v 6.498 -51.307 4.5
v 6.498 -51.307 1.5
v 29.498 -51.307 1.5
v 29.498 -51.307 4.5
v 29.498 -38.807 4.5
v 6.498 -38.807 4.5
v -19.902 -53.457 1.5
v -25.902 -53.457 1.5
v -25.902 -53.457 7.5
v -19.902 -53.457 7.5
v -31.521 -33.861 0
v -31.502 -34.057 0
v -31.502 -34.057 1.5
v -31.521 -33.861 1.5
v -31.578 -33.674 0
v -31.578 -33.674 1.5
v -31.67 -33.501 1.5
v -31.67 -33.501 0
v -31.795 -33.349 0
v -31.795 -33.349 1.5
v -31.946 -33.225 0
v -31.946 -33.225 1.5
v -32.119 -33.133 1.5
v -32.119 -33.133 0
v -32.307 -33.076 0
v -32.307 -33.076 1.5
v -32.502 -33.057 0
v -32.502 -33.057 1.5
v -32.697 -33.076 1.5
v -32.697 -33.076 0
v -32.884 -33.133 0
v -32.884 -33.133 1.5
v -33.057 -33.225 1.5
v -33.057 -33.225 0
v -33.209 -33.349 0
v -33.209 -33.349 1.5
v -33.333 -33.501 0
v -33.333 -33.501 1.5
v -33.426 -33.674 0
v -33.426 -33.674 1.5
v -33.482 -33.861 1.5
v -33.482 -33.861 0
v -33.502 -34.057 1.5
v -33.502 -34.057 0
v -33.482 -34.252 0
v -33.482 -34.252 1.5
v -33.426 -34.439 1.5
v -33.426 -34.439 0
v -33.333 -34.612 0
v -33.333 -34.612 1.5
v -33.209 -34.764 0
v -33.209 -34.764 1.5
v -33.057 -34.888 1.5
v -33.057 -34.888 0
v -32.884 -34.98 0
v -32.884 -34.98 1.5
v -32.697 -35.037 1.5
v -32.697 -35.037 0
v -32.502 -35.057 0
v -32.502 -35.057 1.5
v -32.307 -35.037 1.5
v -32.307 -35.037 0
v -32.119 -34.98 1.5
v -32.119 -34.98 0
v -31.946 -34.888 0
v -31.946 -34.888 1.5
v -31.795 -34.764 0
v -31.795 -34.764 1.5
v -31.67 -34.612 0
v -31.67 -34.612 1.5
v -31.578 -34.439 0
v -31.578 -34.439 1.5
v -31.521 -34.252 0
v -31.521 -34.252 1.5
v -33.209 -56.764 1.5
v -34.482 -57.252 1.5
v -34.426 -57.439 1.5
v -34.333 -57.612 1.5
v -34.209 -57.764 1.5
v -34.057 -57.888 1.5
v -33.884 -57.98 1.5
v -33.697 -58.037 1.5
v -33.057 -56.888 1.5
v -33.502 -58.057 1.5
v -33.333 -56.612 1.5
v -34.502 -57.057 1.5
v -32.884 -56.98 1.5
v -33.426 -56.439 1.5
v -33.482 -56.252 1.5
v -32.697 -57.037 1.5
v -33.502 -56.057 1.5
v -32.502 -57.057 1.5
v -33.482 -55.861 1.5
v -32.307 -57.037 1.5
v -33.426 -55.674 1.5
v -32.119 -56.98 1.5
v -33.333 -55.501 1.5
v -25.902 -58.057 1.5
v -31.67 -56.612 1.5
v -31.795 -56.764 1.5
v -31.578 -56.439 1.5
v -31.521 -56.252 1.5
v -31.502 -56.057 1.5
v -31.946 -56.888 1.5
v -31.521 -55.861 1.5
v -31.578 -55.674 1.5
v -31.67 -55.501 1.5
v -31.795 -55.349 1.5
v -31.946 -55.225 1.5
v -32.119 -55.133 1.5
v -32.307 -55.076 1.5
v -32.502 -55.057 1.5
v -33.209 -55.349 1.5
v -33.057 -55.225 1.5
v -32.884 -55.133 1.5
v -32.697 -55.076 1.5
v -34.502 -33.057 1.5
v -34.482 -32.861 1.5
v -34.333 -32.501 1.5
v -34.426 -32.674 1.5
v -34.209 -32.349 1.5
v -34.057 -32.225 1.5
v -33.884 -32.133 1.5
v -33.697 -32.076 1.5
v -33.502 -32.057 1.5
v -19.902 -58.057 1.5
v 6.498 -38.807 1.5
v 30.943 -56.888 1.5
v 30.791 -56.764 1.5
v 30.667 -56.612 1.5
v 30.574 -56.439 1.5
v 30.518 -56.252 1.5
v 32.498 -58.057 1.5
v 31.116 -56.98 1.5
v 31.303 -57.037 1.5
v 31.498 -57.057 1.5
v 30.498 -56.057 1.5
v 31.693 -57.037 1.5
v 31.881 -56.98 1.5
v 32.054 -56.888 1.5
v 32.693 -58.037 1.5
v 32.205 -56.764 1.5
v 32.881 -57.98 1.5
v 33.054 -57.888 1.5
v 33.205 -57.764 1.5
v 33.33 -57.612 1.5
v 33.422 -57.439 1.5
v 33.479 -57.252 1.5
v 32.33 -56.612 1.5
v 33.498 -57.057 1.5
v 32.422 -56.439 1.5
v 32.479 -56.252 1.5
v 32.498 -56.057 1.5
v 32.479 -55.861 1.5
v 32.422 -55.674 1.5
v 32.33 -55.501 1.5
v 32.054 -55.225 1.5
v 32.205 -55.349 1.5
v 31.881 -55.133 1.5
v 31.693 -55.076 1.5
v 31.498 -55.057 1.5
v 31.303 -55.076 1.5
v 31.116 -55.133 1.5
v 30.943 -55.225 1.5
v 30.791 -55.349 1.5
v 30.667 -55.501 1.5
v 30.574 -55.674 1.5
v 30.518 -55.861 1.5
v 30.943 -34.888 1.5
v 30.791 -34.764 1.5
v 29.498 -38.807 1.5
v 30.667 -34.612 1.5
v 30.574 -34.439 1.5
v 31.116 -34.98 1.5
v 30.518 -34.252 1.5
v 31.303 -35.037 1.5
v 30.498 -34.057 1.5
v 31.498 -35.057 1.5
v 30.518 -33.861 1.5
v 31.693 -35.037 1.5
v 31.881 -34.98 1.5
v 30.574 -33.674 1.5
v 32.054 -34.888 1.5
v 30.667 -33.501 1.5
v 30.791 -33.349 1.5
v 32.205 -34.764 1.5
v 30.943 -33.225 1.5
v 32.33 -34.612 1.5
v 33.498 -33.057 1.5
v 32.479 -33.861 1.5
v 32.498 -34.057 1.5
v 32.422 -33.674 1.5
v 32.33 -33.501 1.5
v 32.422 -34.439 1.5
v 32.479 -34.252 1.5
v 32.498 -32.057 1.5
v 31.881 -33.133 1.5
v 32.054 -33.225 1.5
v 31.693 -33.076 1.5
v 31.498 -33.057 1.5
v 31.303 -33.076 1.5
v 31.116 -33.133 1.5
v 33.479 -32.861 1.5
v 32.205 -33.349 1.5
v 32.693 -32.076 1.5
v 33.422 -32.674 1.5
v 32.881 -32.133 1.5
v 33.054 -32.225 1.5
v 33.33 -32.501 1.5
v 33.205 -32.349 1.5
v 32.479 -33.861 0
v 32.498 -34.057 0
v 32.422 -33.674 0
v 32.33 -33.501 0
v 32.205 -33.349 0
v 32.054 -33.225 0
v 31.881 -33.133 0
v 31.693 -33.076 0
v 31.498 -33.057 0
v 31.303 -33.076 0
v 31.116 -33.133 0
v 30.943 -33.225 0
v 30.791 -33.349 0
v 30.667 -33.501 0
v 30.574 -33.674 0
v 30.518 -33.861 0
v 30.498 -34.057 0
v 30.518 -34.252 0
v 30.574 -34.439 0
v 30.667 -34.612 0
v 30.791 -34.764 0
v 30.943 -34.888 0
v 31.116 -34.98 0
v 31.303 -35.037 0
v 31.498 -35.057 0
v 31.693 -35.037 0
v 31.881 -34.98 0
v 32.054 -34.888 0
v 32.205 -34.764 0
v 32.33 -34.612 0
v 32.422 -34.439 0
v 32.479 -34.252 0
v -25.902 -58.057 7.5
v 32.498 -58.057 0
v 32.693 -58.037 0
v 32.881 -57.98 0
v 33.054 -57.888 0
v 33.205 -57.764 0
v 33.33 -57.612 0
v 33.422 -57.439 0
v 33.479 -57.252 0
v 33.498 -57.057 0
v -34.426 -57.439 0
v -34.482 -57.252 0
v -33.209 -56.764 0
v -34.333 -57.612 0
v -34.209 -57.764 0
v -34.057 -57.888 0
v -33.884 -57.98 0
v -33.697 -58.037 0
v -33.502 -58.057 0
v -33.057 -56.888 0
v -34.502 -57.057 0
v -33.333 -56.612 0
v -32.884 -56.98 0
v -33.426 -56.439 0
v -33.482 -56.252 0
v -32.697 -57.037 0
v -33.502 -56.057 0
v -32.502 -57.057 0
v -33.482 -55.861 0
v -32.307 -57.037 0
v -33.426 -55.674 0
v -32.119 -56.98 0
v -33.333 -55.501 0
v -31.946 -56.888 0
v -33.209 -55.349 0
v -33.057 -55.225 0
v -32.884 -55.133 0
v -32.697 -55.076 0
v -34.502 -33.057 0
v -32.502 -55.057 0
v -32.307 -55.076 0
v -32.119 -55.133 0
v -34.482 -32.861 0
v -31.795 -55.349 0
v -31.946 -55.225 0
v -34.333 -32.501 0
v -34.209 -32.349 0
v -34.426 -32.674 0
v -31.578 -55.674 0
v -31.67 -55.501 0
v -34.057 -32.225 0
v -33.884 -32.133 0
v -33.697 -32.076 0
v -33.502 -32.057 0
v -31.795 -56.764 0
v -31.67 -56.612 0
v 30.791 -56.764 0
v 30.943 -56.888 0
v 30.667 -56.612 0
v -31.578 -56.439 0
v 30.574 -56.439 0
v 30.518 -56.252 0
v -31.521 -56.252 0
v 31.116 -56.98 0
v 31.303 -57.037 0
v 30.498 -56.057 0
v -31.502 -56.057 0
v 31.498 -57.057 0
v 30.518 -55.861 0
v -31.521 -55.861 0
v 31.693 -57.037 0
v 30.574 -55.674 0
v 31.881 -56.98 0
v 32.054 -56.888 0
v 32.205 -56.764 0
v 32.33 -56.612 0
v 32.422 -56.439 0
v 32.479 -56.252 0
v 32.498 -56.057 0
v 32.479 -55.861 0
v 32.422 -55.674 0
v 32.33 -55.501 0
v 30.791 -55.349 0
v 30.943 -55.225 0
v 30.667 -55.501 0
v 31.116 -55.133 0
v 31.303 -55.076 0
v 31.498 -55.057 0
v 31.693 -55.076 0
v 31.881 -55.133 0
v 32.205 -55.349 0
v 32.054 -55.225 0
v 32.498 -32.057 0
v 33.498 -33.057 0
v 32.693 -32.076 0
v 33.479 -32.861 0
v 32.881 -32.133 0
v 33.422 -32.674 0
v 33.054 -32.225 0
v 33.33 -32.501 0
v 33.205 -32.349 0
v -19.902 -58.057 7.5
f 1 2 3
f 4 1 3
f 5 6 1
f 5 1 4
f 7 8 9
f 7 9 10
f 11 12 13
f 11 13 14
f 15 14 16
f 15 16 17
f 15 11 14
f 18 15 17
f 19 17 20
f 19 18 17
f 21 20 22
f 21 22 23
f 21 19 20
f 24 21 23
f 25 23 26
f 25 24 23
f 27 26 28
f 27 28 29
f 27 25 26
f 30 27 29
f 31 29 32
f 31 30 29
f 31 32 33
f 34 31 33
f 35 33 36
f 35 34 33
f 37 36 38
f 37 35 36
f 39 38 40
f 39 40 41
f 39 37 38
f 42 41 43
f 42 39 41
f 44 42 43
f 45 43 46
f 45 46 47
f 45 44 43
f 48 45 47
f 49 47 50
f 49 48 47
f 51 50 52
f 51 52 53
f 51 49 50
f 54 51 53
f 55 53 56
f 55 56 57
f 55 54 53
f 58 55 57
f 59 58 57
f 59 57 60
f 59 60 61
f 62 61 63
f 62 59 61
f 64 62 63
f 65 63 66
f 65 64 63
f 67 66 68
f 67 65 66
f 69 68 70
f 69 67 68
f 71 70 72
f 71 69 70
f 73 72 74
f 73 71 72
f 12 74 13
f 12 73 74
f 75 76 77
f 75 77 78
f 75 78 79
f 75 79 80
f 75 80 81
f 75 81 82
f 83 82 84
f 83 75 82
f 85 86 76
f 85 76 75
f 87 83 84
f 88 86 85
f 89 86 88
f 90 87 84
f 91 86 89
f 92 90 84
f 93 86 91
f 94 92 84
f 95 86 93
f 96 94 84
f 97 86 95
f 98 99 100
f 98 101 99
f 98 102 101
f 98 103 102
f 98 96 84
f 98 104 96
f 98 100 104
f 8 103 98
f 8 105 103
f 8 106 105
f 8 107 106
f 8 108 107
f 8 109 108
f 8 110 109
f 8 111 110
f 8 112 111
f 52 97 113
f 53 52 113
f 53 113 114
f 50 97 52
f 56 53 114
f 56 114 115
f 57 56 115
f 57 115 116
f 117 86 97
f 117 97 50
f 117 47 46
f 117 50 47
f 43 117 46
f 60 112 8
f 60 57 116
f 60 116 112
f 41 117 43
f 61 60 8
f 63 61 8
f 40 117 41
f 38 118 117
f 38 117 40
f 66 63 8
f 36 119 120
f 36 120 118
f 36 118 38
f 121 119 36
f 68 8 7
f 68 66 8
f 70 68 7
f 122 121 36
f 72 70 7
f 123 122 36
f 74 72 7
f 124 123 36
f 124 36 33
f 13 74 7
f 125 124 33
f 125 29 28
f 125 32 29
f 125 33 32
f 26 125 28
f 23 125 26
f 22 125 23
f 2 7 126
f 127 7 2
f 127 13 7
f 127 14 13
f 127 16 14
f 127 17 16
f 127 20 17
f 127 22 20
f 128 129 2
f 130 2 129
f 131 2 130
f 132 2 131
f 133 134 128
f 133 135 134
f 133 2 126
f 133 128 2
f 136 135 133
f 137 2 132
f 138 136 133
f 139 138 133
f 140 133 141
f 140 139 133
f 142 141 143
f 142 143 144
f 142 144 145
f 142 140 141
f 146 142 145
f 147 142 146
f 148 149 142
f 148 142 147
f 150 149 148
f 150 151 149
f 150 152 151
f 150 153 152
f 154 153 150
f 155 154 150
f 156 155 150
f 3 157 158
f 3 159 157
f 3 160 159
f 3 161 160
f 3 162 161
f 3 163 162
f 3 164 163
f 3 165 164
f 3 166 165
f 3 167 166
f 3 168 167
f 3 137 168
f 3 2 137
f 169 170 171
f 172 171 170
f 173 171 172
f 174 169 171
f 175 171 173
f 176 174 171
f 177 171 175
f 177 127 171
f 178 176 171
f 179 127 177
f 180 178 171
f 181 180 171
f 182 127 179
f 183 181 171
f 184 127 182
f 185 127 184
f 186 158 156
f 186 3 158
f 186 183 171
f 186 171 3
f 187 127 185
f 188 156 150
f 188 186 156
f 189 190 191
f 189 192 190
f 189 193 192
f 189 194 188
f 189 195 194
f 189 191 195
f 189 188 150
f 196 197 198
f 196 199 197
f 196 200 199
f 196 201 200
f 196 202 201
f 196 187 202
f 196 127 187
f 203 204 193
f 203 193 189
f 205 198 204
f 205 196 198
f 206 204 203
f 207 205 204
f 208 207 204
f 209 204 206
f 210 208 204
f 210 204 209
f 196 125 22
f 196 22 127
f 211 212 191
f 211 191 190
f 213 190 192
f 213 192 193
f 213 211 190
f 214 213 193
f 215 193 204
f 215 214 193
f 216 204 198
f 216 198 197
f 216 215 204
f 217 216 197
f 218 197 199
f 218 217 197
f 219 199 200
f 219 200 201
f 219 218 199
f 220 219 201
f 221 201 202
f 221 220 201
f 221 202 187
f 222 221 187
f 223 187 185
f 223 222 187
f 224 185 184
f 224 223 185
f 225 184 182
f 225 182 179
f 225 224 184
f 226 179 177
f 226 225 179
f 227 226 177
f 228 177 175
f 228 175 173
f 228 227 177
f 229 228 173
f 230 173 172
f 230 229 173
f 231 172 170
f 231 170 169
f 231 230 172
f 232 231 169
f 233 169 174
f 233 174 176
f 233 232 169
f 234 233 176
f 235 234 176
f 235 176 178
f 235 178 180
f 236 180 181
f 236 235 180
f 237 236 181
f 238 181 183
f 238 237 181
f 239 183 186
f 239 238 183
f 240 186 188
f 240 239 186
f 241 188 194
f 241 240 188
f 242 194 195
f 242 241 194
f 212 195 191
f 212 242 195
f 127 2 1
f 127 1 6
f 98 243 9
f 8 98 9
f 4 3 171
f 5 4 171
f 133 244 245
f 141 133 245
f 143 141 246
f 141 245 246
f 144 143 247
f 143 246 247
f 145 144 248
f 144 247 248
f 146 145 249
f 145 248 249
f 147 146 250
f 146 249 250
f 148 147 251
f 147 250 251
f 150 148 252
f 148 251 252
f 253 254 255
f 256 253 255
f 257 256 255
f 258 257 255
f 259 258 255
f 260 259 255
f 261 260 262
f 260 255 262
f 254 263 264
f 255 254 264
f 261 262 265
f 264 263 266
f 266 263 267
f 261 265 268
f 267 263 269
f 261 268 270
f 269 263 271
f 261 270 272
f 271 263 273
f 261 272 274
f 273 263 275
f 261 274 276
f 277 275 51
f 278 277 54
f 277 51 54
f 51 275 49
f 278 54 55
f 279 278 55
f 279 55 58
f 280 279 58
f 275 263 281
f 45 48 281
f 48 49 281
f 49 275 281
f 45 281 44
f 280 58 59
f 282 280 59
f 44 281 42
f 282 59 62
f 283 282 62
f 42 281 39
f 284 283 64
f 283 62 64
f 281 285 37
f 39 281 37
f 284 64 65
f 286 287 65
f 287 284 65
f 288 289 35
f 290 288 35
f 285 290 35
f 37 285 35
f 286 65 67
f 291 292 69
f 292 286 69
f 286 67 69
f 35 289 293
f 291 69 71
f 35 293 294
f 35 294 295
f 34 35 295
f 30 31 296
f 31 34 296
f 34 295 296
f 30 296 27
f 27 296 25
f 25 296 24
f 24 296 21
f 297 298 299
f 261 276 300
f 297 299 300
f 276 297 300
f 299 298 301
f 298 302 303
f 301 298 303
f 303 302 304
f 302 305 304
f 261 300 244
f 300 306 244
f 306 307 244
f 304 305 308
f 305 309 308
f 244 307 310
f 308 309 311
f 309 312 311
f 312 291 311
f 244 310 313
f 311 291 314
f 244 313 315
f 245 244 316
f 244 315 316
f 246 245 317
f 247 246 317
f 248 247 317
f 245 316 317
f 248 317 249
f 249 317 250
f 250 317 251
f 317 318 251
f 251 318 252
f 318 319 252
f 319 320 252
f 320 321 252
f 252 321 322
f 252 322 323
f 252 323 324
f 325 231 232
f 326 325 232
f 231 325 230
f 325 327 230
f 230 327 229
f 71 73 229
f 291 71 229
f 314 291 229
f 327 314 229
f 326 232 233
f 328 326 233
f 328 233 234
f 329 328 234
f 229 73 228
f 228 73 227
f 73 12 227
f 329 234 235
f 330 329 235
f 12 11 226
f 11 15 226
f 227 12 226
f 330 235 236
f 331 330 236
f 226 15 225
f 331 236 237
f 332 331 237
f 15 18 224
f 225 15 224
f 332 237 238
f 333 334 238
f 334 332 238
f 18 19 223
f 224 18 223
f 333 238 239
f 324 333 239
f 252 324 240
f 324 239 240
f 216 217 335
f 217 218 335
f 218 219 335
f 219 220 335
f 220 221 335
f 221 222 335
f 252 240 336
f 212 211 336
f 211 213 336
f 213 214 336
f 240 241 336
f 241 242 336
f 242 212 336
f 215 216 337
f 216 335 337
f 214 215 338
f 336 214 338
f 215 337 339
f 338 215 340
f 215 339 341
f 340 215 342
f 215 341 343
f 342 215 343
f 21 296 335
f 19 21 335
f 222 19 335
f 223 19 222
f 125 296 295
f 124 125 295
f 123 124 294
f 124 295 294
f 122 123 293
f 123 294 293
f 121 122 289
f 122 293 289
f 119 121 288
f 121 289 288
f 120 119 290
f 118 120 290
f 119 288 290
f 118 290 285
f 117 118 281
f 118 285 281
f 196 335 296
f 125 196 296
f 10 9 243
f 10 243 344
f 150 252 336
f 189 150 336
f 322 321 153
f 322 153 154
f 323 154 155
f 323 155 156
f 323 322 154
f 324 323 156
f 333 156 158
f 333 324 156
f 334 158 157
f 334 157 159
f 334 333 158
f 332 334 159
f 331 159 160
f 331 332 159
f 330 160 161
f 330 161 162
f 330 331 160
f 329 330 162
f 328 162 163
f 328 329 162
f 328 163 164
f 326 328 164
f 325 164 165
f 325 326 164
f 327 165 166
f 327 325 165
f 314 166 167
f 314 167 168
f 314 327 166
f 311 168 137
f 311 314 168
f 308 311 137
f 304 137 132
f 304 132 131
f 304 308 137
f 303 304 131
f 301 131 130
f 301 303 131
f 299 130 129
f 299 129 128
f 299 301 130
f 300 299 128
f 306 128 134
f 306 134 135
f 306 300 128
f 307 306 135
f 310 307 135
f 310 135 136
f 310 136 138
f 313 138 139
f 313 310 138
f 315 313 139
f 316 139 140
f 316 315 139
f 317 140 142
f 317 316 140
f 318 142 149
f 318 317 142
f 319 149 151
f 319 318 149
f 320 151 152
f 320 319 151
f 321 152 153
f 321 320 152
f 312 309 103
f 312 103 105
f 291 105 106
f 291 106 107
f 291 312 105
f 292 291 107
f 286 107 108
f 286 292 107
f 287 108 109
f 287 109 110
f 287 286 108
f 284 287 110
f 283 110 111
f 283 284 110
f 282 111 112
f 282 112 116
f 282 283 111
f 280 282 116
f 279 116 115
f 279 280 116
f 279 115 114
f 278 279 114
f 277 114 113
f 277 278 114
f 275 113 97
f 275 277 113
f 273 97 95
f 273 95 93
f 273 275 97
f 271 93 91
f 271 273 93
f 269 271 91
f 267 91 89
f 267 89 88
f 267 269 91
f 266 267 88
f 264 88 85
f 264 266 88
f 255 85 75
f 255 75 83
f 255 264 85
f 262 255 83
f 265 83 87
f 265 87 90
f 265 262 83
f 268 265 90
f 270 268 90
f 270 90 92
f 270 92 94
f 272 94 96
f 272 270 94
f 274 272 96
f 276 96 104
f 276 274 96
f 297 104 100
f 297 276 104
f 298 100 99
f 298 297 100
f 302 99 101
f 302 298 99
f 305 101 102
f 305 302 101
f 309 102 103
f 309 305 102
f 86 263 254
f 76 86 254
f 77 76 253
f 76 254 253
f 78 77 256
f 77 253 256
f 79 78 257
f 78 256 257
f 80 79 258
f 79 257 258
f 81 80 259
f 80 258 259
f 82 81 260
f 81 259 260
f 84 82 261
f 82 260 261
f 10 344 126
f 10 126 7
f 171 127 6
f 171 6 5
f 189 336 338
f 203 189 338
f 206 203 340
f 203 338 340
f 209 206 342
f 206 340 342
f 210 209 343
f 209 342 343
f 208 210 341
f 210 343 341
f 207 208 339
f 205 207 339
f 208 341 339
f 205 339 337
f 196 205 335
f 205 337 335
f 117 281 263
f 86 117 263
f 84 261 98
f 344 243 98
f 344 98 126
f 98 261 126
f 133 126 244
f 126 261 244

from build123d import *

# Parameters (mm, degrees)
SKETCH_1_R      = 1
EXTRUDE_1_DEPTH = 1.5
SKETCH_2_W      = 23
SKETCH_2_H      = 12.5
EXTRUDE_2_DEPTH = 3
SKETCH_3_W      = 6
SKETCH_3_H      = 4.6
EXTRUDE_3_DEPTH = 6


with BuildPart() as part:
    # 草圖1 → 填料-伸長1 (new body)
    with BuildSketch(Plane.XY):
        with BuildLine():
            Line((-33.501650513, -58.056539749), (32.498349487, -58.056539749))
            ThreePointArc((32.498349487, -58.056539749), (33.205456268, -57.76364653), (33.498349487, -57.056539749))
            Line((33.498349487, -57.056539749), (33.498349487, -33.056539749))
            ThreePointArc((33.498349487, -33.056539749), (33.205456268, -32.349432967), (32.498349487, -32.056539749))
            Line((32.498349487, -32.056539749), (-33.501650513, -32.056539749))
            ThreePointArc((-33.501650513, -32.056539749), (-34.208757294, -32.349432967), (-34.501650513, -33.056539749))
            Line((-34.501650513, -33.056539749), (-34.501650513, -57.056539749))
            ThreePointArc((-34.501650513, -57.056539749), (-34.208757294, -57.76364653), (-33.501650513, -58.056539749))
        make_face()
        with Locations((-32.501650513, -34.056539749)):
            Circle(SKETCH_1_R, mode=Mode.SUBTRACT)
        with Locations((-32.501650513, -56.056539749)):
            Circle(SKETCH_1_R, mode=Mode.SUBTRACT)
        with Locations((31.498349487, -56.056539749)):
            Circle(SKETCH_1_R, mode=Mode.SUBTRACT)
        with Locations((31.498349487, -34.056539749)):
            Circle(SKETCH_1_R, mode=Mode.SUBTRACT)
    extrude(amount=EXTRUDE_1_DEPTH)

    # 草圖2 → 填料-伸長2 (add)
    with BuildSketch(Plane.XY.offset(1.5)):
        with Locations((17.998349487, -45.056539749)):
            Rectangle(SKETCH_2_W, SKETCH_2_H)
    extrude(amount=EXTRUDE_2_DEPTH)

    # 草圖3 → 填料-伸長3 (add)
    with BuildSketch(Plane.XY.offset(1.5)):
        with Locations((-22.901650513, -55.756539749)):
            Rectangle(SKETCH_3_W, SKETCH_3_H)
    extrude(amount=EXTRUDE_3_DEPTH)


solid = part.part
